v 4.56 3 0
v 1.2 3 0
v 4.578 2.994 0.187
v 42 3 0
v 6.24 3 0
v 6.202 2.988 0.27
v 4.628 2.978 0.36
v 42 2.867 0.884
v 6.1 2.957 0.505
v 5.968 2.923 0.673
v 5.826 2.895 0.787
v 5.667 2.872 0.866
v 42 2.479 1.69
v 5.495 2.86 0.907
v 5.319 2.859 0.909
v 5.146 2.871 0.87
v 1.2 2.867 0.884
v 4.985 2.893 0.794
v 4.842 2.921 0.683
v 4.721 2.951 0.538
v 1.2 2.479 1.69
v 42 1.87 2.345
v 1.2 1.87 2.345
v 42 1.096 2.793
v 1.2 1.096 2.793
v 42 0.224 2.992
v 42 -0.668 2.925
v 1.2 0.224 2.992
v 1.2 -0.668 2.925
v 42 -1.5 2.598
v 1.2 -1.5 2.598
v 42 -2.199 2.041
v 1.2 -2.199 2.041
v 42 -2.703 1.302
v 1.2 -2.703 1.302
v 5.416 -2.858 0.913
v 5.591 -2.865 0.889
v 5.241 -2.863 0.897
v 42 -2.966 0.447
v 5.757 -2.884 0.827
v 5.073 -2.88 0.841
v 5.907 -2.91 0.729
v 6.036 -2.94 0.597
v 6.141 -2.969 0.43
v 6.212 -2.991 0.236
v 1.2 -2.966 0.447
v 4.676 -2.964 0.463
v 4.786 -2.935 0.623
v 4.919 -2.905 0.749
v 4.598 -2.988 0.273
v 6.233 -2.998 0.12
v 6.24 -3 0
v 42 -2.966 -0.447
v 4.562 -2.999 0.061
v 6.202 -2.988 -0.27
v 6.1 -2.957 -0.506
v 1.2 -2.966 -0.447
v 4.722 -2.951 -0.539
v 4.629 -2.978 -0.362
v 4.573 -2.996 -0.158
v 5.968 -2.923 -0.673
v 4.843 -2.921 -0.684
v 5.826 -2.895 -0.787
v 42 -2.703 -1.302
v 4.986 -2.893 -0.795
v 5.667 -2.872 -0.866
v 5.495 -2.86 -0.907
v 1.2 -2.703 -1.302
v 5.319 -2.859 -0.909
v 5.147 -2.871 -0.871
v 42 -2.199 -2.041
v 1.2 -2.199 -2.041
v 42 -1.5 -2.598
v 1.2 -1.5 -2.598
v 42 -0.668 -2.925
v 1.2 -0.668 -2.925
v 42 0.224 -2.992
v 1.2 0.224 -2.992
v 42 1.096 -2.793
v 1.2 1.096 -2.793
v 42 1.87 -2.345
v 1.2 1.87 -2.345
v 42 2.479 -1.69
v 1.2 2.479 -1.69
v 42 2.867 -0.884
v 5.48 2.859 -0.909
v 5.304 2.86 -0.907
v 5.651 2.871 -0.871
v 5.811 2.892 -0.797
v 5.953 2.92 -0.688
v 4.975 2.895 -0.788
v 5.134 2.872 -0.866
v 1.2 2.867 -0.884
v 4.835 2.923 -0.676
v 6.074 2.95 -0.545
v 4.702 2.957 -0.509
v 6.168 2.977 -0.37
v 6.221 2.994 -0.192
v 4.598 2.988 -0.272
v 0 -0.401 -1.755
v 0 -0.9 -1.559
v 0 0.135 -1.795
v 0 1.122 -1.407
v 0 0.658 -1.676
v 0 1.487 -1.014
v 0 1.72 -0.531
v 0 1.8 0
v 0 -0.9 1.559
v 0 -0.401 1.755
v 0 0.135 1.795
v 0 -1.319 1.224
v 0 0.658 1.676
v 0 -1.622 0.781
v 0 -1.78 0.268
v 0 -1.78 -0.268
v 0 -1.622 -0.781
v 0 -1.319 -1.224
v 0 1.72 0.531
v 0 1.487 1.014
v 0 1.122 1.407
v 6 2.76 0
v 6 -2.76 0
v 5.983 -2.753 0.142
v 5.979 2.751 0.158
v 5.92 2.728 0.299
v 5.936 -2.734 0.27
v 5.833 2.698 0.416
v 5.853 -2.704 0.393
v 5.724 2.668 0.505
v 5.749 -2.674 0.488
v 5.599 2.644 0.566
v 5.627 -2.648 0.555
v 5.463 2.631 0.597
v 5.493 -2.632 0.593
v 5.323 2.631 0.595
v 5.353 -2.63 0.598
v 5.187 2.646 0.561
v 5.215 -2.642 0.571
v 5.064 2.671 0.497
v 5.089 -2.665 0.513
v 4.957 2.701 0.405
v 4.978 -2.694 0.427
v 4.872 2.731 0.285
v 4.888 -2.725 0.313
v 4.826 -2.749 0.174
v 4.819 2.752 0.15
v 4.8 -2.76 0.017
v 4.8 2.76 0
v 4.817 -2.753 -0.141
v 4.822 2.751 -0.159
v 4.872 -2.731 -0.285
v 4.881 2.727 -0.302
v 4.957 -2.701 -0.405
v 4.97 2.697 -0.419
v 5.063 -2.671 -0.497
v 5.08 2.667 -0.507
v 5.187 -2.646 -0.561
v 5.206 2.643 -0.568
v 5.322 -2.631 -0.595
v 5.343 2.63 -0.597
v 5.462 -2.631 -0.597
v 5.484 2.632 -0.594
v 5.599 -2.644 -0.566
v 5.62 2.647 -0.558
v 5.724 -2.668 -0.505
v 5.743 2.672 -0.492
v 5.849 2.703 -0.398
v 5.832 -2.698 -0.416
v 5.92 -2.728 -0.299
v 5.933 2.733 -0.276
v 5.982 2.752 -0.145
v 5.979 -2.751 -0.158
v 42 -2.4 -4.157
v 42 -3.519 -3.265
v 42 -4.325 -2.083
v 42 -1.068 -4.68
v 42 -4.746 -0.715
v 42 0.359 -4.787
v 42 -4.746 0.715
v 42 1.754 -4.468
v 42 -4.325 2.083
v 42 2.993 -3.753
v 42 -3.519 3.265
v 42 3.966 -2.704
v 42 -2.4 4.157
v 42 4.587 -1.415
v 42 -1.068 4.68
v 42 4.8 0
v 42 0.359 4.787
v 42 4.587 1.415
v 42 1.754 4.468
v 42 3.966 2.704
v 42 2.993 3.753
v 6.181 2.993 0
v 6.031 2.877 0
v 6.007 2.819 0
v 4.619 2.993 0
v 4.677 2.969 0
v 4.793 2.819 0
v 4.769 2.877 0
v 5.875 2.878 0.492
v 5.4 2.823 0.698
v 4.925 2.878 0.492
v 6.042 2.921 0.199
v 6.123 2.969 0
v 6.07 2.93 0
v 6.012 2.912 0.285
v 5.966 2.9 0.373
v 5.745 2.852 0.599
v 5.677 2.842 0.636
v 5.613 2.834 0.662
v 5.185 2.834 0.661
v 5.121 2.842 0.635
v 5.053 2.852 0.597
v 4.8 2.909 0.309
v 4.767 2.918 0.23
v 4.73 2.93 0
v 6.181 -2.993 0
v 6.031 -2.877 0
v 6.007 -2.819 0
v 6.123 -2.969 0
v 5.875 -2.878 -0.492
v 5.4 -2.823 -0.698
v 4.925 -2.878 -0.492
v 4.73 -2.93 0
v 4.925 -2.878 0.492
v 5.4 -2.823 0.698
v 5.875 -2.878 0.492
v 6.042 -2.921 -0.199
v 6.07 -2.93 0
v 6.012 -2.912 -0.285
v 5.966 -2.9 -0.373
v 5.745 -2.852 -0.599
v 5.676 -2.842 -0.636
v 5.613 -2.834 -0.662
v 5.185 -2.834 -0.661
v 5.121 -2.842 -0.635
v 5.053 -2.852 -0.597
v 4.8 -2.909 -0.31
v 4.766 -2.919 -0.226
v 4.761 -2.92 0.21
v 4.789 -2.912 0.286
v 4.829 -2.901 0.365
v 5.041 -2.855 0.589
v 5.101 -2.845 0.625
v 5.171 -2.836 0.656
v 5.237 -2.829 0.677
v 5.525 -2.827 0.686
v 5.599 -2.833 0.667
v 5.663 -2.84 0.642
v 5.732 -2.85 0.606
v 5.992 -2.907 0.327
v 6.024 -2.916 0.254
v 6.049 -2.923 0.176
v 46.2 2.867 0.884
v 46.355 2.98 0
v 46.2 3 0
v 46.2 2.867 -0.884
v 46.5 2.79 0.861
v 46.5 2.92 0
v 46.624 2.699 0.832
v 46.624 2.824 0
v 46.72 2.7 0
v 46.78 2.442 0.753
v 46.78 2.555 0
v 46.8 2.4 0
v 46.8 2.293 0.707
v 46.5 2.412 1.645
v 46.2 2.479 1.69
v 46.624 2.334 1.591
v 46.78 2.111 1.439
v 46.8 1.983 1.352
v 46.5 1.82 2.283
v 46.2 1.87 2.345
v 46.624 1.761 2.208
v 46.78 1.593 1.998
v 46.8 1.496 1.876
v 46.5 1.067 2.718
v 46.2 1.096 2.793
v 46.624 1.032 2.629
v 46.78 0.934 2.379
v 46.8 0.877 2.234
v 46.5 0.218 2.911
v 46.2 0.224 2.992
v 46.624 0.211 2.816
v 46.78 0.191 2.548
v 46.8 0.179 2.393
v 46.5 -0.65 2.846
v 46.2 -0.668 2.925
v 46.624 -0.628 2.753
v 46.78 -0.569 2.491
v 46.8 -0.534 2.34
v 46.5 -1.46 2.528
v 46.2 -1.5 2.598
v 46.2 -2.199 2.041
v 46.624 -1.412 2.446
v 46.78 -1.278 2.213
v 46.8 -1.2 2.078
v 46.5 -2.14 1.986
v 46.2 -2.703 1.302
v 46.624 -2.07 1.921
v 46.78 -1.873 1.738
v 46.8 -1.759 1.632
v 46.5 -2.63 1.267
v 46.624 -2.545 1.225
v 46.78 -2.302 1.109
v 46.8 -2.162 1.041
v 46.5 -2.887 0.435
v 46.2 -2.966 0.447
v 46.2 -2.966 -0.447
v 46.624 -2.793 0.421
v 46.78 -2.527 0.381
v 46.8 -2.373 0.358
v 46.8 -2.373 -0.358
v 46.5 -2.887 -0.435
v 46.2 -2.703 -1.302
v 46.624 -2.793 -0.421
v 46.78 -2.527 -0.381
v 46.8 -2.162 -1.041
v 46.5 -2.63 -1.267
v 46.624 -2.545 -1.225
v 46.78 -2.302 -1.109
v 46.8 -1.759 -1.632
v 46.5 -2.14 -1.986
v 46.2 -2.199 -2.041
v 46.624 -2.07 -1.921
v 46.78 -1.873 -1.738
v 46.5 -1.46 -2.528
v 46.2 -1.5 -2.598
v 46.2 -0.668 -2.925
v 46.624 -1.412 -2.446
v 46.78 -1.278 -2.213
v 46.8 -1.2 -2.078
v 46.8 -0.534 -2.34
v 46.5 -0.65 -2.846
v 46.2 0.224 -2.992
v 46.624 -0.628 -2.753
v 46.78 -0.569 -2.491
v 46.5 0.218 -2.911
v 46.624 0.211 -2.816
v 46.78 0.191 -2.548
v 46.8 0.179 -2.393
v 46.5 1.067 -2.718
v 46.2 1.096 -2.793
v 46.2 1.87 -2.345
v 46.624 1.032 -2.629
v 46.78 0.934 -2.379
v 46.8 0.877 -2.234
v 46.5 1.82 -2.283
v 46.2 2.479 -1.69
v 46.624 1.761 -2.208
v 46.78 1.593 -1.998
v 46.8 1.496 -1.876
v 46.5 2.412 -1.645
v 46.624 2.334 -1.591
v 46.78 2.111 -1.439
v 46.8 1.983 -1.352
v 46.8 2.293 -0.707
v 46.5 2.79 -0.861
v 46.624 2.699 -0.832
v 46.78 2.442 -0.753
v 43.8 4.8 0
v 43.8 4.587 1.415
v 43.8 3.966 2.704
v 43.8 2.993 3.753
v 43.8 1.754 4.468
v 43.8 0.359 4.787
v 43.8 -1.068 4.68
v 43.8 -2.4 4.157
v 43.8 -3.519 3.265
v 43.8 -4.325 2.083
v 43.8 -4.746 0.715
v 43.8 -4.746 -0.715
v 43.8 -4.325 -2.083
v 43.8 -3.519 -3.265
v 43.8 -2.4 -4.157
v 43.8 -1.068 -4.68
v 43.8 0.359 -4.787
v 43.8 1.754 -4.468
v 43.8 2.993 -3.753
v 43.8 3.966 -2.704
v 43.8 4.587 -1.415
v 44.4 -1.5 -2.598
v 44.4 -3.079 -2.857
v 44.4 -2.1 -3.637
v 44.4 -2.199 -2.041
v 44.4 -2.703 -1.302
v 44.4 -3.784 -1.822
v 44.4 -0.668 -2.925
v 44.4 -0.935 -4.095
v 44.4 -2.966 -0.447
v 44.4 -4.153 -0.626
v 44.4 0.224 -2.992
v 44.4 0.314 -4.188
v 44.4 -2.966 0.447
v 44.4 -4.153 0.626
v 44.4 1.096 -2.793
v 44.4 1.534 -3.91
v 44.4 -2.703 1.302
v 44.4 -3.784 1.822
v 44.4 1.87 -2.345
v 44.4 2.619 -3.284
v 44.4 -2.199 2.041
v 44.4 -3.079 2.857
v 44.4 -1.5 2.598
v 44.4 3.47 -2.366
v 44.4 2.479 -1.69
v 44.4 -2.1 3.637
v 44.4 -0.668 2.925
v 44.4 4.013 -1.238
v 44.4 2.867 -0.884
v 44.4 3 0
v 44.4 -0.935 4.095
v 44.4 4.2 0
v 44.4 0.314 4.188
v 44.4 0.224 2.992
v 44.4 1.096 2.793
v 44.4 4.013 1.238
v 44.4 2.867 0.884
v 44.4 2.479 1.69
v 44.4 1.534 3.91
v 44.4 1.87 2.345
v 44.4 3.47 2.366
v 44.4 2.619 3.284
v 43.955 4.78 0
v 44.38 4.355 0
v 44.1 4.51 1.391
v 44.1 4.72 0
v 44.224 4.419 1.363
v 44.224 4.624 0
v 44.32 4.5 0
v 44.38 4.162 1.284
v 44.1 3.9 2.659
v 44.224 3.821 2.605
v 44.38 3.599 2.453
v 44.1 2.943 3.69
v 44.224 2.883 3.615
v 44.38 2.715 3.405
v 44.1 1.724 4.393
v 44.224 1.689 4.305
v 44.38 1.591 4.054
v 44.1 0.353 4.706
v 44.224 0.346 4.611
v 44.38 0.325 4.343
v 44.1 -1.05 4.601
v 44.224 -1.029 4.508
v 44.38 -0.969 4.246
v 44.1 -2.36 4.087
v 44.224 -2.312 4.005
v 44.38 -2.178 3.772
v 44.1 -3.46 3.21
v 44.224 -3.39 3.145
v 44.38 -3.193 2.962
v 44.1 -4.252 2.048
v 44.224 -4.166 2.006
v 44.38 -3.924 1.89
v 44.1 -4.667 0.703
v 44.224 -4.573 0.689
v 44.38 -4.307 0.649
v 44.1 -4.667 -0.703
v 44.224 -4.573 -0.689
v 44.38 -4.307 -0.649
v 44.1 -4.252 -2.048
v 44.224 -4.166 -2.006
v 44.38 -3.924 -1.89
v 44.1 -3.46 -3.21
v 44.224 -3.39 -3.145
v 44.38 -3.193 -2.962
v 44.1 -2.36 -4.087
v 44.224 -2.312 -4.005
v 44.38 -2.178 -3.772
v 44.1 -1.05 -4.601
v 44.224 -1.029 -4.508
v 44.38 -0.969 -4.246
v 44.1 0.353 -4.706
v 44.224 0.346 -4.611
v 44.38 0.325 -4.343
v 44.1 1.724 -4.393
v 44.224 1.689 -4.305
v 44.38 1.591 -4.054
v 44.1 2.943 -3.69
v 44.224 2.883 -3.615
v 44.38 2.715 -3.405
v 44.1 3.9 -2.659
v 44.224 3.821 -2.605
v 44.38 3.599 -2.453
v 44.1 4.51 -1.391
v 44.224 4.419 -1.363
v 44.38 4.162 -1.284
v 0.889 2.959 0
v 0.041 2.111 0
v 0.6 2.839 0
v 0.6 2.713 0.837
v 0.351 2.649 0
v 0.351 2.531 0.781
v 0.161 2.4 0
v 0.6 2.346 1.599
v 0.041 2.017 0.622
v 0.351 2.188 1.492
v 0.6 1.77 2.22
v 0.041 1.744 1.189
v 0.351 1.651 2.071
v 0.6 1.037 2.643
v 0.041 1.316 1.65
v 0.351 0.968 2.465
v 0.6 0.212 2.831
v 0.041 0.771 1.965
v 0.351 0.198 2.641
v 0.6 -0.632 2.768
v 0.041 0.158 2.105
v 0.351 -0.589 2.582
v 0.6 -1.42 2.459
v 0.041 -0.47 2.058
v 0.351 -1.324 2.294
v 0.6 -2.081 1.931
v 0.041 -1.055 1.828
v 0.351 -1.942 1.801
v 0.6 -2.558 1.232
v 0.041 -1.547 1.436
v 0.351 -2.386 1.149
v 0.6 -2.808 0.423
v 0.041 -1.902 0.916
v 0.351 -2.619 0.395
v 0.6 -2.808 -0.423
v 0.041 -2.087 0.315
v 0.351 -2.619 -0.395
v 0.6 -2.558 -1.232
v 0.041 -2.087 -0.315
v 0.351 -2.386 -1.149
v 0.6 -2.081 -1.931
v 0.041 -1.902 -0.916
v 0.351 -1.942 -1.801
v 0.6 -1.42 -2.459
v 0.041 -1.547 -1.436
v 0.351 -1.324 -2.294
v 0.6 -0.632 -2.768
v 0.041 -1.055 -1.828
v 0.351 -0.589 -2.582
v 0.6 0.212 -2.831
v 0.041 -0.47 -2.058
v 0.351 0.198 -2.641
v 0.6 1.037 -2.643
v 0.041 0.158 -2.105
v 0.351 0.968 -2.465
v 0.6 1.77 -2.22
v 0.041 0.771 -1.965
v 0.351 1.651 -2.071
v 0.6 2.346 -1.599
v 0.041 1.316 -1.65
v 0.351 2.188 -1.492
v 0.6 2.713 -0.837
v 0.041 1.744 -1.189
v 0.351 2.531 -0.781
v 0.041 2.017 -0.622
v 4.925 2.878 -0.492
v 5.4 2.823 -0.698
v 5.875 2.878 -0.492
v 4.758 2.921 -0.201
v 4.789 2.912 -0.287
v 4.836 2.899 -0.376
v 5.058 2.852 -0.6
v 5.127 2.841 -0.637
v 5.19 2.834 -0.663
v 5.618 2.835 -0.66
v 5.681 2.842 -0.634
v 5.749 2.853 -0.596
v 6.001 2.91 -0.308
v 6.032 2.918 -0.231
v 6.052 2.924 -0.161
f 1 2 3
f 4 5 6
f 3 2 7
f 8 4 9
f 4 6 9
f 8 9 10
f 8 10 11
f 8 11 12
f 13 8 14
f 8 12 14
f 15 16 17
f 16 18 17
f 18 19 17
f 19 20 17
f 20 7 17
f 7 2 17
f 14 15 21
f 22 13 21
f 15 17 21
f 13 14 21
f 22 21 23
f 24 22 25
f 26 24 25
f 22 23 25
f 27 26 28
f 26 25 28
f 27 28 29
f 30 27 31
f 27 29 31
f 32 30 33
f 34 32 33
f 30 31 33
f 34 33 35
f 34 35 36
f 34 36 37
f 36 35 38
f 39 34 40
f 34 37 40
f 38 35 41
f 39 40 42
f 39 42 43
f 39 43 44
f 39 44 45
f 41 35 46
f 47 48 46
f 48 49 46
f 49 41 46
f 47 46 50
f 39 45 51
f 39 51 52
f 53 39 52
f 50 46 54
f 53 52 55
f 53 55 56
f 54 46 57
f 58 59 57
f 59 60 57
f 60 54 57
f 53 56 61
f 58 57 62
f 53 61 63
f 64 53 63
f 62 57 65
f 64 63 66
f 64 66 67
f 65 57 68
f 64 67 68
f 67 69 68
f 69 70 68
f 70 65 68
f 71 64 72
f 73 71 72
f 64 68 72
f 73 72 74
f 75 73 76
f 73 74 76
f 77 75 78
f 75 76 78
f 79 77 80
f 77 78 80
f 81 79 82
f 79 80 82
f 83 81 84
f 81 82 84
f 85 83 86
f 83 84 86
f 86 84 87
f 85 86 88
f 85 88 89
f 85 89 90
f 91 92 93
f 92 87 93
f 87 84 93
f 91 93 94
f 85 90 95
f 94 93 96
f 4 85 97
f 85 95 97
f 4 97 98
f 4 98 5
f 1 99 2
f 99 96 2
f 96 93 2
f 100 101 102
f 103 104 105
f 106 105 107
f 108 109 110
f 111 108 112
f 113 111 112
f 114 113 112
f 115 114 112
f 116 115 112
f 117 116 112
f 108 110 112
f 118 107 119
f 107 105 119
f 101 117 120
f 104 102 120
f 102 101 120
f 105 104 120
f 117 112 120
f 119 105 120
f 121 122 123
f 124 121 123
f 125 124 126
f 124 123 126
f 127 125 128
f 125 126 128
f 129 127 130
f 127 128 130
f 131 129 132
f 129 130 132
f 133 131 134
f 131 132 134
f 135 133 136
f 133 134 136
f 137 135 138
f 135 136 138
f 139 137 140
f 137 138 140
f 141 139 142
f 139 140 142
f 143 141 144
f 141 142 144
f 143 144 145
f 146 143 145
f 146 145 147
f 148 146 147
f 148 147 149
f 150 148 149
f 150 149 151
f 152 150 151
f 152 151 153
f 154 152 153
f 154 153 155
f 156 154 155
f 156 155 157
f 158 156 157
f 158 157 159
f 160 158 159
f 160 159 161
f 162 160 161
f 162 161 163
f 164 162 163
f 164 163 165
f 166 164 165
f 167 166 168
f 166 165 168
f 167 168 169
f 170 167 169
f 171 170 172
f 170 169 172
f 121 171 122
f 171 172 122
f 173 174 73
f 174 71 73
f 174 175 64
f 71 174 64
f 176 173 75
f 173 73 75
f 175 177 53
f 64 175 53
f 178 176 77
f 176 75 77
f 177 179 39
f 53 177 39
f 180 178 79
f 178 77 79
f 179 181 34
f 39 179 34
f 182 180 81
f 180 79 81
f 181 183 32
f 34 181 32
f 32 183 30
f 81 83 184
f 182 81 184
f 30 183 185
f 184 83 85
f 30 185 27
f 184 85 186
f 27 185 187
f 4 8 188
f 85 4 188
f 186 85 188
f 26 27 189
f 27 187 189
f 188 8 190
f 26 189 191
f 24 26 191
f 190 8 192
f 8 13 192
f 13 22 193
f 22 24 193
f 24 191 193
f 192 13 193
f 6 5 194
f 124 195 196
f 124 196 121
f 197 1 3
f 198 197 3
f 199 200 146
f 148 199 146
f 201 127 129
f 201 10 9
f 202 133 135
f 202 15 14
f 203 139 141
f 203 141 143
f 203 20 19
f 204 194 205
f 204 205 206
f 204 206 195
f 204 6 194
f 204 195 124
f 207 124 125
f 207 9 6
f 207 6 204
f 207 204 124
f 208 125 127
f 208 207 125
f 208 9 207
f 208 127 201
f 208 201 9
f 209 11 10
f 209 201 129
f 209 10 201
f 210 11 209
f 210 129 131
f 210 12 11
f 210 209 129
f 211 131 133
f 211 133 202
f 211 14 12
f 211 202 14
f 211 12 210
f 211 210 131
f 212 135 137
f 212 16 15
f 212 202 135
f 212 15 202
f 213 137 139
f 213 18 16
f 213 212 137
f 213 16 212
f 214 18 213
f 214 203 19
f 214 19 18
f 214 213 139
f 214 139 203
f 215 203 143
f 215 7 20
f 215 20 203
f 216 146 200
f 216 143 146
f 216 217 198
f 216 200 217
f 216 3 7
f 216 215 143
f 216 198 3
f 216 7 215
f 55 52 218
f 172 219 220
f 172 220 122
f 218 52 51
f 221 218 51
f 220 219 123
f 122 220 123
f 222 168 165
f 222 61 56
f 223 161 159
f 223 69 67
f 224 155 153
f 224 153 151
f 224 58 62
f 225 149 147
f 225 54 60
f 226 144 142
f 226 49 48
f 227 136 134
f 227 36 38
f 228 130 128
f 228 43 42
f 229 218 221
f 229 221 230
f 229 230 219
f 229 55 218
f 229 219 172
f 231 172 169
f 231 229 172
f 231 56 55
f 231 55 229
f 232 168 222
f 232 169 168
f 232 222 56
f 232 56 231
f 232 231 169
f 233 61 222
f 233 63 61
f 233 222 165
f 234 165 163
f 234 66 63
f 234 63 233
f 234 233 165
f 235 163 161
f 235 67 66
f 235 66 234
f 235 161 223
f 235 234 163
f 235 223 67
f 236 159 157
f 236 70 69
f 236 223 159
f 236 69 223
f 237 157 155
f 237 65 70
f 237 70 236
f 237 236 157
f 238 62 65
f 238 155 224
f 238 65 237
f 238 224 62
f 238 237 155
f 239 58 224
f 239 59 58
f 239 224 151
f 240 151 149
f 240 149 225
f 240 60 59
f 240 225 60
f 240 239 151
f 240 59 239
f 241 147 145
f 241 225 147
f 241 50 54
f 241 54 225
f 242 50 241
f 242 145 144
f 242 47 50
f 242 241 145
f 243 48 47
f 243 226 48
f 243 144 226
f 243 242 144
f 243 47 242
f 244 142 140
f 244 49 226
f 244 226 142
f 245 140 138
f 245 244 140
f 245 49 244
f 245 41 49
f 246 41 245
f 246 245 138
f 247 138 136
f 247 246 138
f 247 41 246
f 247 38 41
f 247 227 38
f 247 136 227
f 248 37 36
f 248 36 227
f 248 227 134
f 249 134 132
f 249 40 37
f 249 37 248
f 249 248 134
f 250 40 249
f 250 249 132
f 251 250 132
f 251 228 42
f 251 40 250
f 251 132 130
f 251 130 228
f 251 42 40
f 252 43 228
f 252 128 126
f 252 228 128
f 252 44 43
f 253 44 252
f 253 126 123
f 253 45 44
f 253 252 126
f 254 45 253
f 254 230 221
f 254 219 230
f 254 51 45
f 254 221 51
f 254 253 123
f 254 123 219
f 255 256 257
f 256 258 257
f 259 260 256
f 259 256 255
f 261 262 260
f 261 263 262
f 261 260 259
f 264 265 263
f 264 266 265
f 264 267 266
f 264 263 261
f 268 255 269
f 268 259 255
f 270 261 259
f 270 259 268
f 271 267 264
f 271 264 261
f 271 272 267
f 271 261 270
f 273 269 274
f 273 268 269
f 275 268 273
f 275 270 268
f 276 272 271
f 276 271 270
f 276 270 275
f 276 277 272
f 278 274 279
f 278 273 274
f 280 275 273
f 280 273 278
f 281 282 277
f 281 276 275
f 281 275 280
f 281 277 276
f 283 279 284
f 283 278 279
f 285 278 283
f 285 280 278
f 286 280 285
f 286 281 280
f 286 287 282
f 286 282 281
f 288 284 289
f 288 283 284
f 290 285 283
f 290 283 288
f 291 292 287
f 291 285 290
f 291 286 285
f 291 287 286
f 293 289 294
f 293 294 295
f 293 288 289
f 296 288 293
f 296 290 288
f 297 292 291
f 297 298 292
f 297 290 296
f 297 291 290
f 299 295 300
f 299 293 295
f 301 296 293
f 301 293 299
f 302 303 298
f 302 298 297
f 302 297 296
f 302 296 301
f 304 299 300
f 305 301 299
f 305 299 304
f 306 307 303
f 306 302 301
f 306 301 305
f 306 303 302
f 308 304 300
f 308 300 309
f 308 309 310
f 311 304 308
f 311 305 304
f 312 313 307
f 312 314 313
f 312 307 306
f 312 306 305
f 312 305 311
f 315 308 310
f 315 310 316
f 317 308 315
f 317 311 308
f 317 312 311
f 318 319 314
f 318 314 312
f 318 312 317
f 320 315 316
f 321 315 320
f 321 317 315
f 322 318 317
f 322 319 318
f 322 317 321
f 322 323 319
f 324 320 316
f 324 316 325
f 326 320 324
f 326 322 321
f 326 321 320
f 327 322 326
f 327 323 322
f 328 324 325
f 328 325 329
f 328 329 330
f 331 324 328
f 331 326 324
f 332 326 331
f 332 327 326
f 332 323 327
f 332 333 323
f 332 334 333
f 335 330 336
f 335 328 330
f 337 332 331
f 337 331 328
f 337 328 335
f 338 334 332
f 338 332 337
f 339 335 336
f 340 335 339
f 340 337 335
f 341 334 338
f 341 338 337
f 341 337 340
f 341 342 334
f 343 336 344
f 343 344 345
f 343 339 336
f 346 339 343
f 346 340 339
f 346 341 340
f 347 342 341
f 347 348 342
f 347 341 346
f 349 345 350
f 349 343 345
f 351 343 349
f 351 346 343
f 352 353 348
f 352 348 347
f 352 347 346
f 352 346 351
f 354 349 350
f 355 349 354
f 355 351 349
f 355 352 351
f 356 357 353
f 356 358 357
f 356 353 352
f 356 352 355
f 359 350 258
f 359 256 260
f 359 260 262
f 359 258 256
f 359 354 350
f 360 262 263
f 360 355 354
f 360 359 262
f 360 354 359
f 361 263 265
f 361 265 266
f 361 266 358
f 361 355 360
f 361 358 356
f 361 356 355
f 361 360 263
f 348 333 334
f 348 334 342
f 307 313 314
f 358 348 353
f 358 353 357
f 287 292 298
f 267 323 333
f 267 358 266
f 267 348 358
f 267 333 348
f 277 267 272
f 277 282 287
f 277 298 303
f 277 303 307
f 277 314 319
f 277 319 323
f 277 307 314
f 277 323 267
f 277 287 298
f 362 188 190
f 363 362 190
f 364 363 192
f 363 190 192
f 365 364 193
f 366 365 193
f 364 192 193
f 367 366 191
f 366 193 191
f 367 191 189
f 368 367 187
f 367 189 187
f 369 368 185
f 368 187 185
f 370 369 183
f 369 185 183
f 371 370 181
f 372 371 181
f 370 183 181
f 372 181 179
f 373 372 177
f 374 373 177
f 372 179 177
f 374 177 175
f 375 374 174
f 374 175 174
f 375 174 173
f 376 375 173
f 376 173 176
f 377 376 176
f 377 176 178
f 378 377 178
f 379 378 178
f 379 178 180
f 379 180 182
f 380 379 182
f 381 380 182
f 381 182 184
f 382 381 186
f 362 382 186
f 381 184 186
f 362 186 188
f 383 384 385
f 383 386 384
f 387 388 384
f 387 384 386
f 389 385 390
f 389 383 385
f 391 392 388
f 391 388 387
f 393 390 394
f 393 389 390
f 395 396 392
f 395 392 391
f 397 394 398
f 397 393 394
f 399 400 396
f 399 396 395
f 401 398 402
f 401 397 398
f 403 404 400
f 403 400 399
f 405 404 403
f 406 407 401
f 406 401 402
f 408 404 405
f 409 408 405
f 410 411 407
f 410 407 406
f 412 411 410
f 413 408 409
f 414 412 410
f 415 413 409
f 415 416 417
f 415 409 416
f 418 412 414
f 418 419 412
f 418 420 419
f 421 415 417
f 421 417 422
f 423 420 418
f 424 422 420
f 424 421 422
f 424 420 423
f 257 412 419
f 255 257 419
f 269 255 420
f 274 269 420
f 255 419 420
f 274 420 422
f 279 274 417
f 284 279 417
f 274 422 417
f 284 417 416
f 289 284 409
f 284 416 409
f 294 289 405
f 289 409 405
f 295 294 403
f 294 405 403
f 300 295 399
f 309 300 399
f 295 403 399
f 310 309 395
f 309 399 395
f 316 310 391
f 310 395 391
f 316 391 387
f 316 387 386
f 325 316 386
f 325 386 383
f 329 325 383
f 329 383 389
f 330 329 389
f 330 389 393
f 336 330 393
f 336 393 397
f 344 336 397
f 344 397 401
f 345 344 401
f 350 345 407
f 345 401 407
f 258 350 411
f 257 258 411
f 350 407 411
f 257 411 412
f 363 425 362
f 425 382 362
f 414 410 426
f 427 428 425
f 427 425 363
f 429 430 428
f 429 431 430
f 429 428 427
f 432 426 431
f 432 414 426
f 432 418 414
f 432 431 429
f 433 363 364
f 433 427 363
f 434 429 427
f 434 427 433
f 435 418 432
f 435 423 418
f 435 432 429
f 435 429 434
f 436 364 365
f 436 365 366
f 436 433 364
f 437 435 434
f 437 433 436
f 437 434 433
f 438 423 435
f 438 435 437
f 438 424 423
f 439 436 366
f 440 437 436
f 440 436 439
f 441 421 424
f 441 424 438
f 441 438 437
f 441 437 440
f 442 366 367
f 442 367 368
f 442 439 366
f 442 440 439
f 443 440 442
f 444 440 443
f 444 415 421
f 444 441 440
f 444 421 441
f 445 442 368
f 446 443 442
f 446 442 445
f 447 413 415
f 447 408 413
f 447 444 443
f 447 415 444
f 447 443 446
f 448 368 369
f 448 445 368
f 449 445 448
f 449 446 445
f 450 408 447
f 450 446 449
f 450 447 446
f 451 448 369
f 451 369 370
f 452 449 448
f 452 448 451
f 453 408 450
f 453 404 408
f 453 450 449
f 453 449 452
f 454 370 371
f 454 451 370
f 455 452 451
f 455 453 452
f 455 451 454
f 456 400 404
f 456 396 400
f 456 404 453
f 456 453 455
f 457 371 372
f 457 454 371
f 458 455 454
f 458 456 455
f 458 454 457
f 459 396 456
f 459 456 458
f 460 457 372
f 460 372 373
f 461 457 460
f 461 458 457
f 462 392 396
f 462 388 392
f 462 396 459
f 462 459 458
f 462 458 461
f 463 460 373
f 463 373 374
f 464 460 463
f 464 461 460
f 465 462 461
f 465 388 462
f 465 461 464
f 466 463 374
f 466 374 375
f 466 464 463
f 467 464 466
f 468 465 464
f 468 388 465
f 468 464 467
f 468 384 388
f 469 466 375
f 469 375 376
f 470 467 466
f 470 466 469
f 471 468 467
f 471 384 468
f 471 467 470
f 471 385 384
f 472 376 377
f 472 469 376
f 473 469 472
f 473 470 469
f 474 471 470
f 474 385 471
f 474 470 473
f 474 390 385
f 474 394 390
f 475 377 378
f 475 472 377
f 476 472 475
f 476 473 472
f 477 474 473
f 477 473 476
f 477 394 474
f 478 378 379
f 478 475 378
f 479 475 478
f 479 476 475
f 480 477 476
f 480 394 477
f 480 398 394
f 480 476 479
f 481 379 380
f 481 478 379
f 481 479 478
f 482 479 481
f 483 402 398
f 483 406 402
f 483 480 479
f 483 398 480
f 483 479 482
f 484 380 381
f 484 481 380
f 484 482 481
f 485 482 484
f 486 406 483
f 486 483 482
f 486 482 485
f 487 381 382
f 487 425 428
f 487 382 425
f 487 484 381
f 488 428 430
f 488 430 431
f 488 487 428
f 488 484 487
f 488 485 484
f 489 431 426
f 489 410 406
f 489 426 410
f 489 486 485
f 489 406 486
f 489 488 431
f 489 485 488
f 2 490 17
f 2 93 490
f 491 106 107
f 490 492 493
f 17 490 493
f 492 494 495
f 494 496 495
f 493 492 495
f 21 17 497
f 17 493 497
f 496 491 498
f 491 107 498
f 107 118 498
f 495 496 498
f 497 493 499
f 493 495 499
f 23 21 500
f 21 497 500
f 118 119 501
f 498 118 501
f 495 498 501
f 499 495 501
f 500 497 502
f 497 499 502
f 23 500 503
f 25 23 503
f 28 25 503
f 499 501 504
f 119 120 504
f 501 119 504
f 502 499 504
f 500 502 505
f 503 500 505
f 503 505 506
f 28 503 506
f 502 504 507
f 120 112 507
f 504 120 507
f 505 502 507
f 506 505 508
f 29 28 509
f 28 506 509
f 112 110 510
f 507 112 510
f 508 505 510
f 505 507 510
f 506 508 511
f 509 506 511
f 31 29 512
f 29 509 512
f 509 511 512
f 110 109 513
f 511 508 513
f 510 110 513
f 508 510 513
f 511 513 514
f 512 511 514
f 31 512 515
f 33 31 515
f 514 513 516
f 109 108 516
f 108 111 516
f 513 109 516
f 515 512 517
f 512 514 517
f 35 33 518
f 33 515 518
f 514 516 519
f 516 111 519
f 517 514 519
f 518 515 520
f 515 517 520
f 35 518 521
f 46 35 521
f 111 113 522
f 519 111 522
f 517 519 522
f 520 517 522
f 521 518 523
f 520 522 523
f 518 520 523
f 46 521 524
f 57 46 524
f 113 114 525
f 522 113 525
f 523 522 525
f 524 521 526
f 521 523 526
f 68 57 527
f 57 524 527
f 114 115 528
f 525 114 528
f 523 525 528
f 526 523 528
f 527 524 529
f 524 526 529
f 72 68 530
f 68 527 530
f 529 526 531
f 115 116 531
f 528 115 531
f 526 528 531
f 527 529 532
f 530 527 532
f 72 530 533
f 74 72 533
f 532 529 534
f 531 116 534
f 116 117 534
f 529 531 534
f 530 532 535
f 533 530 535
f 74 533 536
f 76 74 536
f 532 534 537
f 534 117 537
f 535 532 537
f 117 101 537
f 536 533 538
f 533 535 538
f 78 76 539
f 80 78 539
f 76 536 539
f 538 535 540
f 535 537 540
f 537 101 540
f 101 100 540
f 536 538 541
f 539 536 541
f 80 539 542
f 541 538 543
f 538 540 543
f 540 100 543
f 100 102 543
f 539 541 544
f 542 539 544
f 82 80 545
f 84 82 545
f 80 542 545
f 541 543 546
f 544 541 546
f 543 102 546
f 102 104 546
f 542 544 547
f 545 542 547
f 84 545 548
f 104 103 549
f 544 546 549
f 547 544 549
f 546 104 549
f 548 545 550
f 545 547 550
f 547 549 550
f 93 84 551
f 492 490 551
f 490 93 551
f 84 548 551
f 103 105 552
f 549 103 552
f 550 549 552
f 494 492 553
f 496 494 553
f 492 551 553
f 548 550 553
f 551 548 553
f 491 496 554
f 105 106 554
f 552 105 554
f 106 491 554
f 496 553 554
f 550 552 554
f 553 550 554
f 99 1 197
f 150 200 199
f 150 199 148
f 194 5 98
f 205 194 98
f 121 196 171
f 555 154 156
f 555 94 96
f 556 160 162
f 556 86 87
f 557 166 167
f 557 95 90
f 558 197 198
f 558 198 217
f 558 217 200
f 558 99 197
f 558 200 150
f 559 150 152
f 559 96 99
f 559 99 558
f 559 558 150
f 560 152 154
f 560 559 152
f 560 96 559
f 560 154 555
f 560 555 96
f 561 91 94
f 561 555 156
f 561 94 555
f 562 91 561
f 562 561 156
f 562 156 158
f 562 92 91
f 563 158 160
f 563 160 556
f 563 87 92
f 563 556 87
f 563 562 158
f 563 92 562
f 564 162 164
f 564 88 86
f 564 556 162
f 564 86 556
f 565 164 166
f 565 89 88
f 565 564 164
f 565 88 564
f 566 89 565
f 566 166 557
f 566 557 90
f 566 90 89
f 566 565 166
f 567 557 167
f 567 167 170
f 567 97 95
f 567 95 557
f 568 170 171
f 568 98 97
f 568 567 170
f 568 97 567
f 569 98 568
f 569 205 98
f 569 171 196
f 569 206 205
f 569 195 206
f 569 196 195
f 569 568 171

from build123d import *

# Parameters (mm, degrees)
F0_R      = 12.5
F1_DEPTH  = 175
F2_R      = 20
F3_DEPTH  = 10
F4_R      = 12.5
F5_DEPTH  = 10
F6_R      = 2.5
F7_R      = 2.5
F8_DEPTH  = 12.5
F9_R      = 1
F10_R     = 5
F11_SCALE = 0.24


with BuildPart() as f1:
    # F0 (on Right) → F1 (new body)
    with BuildSketch(Plane.YZ):
        Circle(F0_R)
    extrude(amount=F1_DEPTH)

    # F2 (on face) → F3 (join)
    with BuildSketch(Plane.YZ.offset(175)):
        Circle(F2_R)
    extrude(amount=F3_DEPTH)

    # F4 (on face) → F5 (join)
    with BuildSketch(Plane.YZ.offset(185)):
        Circle(F4_R)
    extrude(amount=F5_DEPTH)

    # F6
    f6_edges = [f1.edges().sort_by_distance(p)[0] for p in [
        (195, -12.5, 0),
        (185, -20, 0),
    ]]
    fillet(f6_edges, radius=F6_R)

    # F7 (on Front) → F8 (cut, symmetric)
    with BuildSketch(Plane.XZ):
        with Locations((22.5, 0)):
            Circle(F7_R)
    extrude(amount=F8_DEPTH, both=True, mode=Mode.SUBTRACT)

    # F9
    f9_edges = [f1.edges().sort_by_distance(p)[0] for p in [
        (22.5, 12.247449, 2.5),
        (22.5, 12.247449, -2.5),
        (20, -12.5, 0),
    ]]
    fillet(f9_edges, radius=F9_R)

    # F10
    f10_edges = [f1.edges().sort_by_distance(p)[0] for p in [
        (0, -12.5, 0),
    ]]
    fillet(f10_edges, radius=F10_R)


with BuildPart() as f1_1:
    # F11: moved
    add(f1.part.scale(F11_SCALE))


solid = f1_1.part
